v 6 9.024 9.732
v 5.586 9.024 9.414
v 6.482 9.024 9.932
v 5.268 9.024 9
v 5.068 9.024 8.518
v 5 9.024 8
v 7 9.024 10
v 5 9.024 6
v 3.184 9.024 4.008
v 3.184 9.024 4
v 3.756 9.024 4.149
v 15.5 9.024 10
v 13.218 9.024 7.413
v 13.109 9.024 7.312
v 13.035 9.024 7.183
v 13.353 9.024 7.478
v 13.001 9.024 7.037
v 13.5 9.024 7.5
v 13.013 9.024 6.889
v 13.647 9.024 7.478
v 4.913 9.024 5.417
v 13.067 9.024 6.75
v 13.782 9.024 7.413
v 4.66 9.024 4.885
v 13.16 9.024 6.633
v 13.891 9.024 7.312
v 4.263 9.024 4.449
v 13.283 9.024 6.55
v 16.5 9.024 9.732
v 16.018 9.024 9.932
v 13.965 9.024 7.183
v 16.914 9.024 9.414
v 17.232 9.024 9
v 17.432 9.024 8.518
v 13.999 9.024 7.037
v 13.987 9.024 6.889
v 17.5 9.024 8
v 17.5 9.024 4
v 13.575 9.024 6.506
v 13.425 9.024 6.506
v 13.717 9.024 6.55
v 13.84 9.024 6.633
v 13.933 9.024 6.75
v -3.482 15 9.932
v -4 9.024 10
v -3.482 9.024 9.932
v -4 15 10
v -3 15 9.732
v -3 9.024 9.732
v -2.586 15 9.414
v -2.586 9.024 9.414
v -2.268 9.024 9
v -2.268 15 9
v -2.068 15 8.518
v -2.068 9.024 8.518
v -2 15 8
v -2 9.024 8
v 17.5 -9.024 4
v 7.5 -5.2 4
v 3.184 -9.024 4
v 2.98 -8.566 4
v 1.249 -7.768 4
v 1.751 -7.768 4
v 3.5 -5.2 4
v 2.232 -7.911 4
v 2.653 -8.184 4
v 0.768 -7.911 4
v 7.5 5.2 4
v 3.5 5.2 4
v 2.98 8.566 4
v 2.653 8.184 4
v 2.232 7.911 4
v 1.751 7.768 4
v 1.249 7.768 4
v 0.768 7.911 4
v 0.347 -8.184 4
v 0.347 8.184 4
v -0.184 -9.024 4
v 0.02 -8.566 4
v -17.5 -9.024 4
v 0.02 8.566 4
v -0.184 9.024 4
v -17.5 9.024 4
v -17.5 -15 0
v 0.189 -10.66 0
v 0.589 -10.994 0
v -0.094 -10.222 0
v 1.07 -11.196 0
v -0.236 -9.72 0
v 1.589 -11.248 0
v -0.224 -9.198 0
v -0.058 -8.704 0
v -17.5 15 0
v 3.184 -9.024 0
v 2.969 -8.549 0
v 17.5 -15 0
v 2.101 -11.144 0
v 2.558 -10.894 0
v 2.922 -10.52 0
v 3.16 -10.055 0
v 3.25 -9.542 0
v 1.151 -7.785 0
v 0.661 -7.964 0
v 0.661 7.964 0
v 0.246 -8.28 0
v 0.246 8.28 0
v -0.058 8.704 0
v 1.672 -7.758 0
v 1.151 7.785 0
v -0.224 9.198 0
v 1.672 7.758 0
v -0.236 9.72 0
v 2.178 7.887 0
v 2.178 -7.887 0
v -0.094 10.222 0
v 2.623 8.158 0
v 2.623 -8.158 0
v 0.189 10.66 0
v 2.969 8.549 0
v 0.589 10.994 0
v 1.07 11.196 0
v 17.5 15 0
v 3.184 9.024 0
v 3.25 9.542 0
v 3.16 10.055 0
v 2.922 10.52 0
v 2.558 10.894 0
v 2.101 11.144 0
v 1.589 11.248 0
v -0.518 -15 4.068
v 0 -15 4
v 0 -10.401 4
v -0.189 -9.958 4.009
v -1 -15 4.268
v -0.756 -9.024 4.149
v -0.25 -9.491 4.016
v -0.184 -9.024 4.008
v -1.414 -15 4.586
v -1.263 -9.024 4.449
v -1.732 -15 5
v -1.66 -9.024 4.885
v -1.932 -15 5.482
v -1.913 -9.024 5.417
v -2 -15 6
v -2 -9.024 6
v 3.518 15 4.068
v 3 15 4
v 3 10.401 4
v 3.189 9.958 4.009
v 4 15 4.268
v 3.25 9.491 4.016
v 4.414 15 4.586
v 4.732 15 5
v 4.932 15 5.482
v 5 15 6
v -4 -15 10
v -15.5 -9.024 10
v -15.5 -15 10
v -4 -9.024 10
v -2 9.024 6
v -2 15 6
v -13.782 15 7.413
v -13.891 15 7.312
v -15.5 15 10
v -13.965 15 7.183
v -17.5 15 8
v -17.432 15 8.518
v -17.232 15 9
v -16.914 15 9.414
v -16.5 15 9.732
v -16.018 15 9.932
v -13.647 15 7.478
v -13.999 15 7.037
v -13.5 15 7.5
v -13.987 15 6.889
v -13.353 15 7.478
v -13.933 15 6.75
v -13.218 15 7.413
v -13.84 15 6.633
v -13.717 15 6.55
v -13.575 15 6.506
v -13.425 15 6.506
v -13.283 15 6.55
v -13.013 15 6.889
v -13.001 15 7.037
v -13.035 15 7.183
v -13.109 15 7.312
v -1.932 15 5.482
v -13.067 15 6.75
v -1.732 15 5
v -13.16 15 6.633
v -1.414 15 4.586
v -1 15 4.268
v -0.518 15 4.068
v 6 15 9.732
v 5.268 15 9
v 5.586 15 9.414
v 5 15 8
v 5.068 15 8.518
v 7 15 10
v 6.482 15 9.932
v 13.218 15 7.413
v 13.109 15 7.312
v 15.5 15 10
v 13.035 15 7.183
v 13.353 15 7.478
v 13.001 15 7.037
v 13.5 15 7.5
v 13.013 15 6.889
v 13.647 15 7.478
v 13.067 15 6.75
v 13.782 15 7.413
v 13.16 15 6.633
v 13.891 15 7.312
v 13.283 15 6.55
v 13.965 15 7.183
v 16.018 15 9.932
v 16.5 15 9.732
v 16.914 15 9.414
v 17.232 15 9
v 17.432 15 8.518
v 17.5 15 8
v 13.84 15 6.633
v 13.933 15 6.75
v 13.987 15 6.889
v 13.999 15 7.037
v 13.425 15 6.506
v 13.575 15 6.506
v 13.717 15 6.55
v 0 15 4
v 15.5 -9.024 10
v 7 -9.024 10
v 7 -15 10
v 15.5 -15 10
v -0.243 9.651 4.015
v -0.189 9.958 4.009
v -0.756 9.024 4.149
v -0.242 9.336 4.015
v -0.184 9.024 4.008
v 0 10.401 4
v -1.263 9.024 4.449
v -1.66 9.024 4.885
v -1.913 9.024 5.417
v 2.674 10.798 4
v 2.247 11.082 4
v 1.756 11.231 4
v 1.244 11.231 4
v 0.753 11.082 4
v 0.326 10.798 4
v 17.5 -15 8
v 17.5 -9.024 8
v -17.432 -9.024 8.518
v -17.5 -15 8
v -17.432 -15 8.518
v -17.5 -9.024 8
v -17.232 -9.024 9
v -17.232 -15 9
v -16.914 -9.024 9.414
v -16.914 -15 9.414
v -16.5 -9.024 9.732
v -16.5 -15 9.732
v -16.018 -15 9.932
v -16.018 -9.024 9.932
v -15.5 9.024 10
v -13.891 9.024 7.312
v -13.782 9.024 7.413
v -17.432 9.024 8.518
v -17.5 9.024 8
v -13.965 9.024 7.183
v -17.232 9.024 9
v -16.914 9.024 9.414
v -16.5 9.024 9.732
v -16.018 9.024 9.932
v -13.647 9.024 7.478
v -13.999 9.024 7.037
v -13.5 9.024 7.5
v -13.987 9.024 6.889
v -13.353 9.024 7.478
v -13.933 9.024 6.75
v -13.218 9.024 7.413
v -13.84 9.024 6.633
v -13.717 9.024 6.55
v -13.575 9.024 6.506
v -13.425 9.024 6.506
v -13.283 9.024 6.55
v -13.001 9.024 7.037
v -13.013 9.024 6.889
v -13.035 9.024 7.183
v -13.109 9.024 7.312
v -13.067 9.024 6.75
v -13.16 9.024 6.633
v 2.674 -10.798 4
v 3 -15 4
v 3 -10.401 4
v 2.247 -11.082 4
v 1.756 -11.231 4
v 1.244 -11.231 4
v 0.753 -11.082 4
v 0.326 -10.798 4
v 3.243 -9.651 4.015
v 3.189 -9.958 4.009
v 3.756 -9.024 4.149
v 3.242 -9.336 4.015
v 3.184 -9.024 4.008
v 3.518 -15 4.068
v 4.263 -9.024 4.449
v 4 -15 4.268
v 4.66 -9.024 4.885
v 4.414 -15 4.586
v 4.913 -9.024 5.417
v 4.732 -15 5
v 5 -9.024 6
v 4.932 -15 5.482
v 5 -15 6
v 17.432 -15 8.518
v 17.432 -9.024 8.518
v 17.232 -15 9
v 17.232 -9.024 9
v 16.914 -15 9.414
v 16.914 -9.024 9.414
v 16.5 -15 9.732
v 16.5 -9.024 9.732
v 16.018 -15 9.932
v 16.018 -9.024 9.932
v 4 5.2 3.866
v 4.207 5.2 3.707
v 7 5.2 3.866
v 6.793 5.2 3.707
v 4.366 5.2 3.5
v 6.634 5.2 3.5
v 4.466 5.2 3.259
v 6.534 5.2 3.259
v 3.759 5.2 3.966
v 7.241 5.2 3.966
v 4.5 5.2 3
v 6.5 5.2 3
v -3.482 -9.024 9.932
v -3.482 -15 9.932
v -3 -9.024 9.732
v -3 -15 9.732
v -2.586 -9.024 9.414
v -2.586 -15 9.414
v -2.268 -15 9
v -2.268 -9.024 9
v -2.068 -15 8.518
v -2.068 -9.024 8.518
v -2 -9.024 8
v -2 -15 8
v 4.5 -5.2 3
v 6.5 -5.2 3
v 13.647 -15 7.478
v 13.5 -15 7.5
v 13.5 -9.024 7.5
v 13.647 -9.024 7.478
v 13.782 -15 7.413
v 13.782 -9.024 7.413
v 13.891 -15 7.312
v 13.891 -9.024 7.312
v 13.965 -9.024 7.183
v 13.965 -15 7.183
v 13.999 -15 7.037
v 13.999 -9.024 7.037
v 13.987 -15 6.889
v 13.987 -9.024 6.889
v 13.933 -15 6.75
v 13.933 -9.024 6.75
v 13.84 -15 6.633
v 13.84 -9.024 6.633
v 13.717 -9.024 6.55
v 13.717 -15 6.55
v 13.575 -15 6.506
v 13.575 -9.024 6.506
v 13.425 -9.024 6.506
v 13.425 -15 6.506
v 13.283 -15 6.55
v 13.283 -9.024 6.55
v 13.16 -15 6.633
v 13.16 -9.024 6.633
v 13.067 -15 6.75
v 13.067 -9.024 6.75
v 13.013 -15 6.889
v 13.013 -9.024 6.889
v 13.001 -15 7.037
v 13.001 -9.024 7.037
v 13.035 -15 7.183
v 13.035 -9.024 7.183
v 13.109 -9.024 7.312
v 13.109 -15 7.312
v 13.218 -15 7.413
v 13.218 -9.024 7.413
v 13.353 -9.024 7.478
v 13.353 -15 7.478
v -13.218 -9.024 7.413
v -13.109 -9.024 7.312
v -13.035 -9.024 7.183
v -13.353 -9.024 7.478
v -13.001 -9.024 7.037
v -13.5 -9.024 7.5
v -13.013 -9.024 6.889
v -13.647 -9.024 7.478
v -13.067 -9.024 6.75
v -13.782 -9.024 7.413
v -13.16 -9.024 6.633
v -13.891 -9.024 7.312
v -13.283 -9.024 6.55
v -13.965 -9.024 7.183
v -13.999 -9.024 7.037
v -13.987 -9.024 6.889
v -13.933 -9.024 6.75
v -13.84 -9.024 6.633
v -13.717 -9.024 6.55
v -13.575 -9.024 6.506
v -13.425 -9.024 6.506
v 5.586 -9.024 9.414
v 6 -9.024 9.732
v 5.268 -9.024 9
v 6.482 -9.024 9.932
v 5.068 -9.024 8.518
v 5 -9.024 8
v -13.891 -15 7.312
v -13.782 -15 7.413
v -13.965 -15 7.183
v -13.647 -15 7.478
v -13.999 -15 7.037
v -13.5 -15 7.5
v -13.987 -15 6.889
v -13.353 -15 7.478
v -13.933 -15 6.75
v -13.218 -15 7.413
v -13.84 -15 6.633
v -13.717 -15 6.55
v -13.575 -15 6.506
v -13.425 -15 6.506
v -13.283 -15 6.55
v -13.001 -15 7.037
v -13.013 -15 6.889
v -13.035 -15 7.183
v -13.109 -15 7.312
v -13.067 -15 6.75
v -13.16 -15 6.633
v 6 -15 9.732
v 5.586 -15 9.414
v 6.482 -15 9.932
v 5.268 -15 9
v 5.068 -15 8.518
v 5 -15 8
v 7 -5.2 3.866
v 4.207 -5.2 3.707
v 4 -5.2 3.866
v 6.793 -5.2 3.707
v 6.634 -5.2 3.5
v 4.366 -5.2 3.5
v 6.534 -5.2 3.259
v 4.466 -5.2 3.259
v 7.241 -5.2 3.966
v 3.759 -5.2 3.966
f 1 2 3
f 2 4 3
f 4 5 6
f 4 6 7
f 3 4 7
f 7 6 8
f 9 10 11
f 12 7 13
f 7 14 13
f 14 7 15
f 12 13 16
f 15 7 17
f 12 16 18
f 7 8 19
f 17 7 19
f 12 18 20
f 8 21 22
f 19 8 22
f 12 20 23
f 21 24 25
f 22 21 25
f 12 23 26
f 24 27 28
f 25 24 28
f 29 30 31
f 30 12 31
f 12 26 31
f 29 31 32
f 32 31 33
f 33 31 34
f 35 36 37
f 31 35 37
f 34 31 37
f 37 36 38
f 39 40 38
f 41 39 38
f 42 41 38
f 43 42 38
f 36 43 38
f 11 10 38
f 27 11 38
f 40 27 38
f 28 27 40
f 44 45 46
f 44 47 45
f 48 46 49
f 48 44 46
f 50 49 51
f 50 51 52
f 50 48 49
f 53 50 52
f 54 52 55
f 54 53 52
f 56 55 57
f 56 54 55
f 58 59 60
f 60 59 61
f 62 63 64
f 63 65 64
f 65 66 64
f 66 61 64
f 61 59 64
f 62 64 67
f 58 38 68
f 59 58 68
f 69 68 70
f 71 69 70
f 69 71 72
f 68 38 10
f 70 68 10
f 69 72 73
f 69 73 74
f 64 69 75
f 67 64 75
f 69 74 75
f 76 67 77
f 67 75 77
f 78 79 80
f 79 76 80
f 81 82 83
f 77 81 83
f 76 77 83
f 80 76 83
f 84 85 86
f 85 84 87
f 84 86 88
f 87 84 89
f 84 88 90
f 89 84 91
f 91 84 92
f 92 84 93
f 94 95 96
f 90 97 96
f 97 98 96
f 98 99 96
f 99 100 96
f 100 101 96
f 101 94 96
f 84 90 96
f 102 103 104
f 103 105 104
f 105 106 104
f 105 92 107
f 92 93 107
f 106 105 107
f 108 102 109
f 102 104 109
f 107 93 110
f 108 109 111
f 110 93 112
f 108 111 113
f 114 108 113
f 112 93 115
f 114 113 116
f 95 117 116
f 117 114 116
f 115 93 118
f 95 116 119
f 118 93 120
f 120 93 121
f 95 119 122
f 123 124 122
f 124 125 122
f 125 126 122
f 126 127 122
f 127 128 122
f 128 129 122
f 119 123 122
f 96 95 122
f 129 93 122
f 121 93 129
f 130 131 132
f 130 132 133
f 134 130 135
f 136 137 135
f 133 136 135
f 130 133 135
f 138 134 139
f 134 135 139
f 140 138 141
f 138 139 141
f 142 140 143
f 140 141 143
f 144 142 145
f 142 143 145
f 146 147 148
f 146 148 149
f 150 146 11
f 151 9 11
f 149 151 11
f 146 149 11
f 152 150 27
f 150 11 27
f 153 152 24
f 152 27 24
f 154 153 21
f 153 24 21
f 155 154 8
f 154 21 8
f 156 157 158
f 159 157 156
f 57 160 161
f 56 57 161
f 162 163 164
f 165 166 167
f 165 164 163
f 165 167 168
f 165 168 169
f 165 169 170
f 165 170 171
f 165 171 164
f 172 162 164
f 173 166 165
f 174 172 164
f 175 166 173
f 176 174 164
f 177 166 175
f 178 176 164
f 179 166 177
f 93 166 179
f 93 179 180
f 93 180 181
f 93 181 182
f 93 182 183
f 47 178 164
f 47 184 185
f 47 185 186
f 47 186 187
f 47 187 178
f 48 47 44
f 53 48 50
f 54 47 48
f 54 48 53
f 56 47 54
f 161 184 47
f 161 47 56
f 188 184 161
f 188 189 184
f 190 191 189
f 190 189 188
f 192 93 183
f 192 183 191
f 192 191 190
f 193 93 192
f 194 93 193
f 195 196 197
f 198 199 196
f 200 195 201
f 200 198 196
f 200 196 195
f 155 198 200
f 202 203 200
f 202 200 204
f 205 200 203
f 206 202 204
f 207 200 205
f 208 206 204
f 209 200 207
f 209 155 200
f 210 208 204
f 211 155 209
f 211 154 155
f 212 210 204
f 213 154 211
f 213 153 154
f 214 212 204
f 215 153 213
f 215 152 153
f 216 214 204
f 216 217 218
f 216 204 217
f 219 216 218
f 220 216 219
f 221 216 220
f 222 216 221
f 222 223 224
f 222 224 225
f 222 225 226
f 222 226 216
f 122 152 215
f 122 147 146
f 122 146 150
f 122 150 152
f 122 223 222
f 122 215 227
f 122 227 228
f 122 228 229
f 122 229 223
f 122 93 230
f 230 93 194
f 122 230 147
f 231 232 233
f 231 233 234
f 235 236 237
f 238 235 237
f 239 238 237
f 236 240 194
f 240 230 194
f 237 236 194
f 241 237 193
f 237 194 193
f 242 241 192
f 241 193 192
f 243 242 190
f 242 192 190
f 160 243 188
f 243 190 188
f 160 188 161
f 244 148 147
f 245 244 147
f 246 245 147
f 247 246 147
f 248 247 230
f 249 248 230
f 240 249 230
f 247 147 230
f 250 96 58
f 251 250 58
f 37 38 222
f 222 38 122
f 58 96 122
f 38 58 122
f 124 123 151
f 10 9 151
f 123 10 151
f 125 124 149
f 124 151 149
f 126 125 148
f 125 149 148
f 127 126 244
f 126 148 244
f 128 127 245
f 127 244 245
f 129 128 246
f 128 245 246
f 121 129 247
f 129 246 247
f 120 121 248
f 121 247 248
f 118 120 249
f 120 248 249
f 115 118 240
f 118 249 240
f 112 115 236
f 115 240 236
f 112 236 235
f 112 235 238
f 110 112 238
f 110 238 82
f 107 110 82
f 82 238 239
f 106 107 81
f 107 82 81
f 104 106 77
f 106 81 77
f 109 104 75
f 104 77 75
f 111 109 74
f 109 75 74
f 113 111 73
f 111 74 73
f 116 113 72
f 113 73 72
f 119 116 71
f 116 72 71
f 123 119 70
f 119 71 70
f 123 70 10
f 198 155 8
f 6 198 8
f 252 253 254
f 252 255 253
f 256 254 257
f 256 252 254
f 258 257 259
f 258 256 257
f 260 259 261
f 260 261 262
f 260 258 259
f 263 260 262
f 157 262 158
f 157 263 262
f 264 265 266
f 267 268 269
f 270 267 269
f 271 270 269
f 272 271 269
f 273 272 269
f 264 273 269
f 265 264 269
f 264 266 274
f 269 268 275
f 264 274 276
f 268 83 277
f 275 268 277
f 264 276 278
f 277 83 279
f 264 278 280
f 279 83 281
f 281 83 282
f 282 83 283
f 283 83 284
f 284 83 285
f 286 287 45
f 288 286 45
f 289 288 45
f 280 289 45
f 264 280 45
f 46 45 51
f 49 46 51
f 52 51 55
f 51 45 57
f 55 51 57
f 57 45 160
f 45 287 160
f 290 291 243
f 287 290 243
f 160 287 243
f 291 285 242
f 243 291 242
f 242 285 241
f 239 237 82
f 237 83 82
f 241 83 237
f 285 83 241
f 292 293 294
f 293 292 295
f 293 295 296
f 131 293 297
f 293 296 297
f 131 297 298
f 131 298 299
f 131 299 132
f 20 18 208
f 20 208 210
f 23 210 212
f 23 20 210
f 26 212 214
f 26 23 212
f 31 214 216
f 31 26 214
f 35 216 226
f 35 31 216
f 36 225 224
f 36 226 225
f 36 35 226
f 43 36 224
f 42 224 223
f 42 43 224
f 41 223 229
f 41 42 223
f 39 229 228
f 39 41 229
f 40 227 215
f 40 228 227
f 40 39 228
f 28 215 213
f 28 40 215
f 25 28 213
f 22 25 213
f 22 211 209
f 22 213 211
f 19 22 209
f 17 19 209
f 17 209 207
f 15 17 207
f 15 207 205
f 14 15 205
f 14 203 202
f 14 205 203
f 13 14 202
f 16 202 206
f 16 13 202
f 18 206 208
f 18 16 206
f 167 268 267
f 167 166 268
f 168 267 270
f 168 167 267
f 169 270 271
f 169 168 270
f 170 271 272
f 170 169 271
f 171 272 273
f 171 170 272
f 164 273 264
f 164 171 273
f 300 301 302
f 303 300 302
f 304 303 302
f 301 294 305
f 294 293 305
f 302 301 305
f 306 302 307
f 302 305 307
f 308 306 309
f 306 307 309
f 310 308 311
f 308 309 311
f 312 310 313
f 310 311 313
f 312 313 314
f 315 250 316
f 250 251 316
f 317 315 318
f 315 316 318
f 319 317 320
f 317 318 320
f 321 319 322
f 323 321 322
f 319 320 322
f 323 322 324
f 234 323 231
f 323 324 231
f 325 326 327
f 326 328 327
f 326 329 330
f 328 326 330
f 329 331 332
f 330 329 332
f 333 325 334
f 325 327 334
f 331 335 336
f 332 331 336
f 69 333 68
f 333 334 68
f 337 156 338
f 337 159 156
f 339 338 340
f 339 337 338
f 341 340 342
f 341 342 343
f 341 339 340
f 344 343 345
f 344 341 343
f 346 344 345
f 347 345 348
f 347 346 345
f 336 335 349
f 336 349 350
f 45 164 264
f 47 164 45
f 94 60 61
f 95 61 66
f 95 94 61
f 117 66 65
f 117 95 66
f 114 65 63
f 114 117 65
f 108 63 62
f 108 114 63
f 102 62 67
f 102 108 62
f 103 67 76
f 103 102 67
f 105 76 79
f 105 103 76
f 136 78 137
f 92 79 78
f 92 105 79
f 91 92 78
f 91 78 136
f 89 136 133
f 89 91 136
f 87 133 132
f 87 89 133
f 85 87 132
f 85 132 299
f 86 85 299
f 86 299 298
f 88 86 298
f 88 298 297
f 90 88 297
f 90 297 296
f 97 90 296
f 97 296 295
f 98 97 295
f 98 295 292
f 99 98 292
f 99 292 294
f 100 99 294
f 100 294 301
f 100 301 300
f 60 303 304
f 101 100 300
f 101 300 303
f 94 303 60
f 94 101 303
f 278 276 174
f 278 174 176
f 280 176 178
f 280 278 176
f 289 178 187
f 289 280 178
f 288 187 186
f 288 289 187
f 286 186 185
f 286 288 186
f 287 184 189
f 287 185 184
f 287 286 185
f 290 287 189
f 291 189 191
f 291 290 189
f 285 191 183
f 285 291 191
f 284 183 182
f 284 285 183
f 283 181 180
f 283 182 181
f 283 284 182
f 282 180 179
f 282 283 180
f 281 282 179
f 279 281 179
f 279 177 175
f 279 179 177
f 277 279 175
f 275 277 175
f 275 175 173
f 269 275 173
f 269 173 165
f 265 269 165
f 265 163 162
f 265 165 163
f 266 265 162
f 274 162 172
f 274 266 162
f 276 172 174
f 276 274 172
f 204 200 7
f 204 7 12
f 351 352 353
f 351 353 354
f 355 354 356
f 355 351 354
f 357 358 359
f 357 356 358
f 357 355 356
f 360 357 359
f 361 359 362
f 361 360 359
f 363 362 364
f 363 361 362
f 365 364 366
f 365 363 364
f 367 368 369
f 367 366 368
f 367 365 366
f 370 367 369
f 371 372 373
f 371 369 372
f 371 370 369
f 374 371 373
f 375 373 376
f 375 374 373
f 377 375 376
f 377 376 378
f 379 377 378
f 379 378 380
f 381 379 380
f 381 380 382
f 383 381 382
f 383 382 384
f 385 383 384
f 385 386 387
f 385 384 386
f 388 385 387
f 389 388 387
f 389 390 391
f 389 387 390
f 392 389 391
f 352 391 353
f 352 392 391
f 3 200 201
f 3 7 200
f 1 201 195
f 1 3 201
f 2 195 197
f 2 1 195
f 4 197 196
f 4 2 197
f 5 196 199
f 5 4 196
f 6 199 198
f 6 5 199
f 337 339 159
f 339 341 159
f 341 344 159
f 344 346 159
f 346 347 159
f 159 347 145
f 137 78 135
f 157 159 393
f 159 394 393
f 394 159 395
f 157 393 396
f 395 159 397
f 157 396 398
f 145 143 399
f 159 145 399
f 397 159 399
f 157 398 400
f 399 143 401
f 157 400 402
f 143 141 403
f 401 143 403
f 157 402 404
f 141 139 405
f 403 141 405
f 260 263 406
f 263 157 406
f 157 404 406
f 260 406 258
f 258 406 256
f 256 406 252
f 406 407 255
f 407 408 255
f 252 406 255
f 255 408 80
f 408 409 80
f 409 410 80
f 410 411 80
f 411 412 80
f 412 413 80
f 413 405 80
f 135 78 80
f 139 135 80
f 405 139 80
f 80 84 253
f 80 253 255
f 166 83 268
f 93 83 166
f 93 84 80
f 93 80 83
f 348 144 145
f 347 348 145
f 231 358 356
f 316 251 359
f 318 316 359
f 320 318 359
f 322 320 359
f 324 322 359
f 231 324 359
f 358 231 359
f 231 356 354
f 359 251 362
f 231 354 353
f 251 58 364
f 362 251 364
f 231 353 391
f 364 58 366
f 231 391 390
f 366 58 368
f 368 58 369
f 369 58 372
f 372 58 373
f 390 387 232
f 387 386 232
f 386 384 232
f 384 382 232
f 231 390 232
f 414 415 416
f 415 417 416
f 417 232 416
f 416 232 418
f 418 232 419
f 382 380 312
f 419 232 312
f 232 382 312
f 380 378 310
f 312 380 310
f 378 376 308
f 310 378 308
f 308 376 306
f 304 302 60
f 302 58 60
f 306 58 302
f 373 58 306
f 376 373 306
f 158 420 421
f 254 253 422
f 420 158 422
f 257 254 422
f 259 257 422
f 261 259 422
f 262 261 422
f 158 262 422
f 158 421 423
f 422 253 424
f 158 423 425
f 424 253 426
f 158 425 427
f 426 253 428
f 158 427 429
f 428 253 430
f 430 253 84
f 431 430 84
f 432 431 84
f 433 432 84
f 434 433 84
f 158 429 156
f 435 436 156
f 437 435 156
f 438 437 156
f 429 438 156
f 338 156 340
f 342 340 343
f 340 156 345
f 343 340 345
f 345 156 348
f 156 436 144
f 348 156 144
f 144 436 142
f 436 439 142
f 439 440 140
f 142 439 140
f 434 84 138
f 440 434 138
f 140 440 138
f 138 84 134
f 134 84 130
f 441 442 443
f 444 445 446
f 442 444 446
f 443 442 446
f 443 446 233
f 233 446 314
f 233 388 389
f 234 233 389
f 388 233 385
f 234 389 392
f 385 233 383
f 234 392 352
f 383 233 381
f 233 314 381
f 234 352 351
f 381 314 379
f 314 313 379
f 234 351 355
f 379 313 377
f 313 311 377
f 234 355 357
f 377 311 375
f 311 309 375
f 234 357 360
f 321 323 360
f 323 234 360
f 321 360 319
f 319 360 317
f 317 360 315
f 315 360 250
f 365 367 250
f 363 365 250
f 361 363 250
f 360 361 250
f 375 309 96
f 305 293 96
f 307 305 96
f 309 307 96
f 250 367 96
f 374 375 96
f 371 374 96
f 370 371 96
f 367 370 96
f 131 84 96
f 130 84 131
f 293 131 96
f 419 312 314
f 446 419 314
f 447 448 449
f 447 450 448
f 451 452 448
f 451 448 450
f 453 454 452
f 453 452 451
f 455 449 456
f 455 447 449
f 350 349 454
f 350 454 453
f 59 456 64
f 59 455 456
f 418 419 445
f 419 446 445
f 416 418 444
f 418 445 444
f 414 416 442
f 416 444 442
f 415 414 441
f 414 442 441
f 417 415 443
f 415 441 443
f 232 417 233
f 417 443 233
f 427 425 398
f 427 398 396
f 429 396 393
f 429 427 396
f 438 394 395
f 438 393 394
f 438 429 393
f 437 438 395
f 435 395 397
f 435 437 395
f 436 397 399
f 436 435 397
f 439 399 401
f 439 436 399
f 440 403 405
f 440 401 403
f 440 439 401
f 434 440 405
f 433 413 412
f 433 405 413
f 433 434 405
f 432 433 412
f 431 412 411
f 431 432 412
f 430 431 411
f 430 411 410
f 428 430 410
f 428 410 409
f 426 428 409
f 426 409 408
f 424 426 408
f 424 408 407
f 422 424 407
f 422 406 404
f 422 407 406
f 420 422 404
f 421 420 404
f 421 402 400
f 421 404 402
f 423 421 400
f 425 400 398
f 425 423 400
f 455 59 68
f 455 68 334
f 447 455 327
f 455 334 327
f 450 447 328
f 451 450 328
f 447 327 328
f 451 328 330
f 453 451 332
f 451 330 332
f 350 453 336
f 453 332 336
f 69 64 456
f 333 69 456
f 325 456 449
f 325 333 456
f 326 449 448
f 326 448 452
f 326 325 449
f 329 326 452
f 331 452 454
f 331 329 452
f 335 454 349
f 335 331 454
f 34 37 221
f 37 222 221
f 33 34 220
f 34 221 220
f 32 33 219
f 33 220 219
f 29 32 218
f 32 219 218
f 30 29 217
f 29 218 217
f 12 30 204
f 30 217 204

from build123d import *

# Parameters (mm, degrees)
SKETCHBUTTOM_W                   = 35
SKETCHBUTTOM_H                   = 30
BOSSEXTRUDEBUTTOM_DEPTH          = 10
CUTEXTRUDEFINGERROOM_START       = 4
CUTEXTRUDEFINGERROOM_DEPTH       = 6
FILLETTOP_R                      = 2
CUTEXTRUDEFINGERSHAFT_DEPTH      = 26.124689053
CUTEXTRUDEFINGERSHAFT_DEPTH_BACK = 26.124689053
SKETCHFINGERSHAFT_R              = 0.5
CUTEXTRUDESENSORROOM_START       = 3
SKETCH12_W                       = 2
SKETCH12_H                       = 10.4
CUTEXTRUDESENSORROOM_DEPTH       = 3
FILLETSENSORROOM_R               = 1
SKETCHFIXTUREHOLES_R             = 1.75
CUTEXTRUDEFIXTUREHOLES_DEPTH     = 5


with BuildPart() as part:
    # SketchButtom → BossExtrudeButtom (new body)
    with BuildSketch(Plane.XY):
        Rectangle(SKETCHBUTTOM_W, SKETCHBUTTOM_H)
    extrude(amount=BOSSEXTRUDEBUTTOM_DEPTH)

    # SketchFingerRoom → CutExtrudeFingerRoom (cut)
    with BuildSketch(Plane.XY.offset(CUTEXTRUDEFINGERROOM_START)):
        Polygon((5, 9.024), (17.5, 9.024), (17.5, -9.024), (5, -9.024), (5, -15), (-2, -15), (-2, -9.024), (-17.5, -9.024), (-17.5, 9.024), (-2, 9.024), (-2, 15), (5, 15), align=None)
    extrude(amount=CUTEXTRUDEFINGERROOM_DEPTH, mode=Mode.SUBTRACT)

    # FilletTop
    fillettop_edges = [part.edges().sort_by_distance(p)[0] for p in [
        (17.5, -12.012, 10),
        (-17.5, -12.012, 10),
        (17.5, 12.012, 10),
        (-2, 12.012, 4),
        (-2, -12.012, 4),
        (5, -12.012, 4),
        (5, 12.012, 4),
        (-2, 12.012, 10),
        (-2, -12.012, 10),
        (5, -12.012, 10),
        (5, 12.012, 10),
        (-17.5, 12.012, 10),
    ]]
    fillet(fillettop_edges, radius=FILLETTOP_R)

    # SketchFingerShaft → CutExtrudeFingerShaft (cut, two sides: drawn at the far end of the back side and taken through both)
    with BuildSketch(Plane(origin=(0, 0, 0), x_dir=(1, 0, 0), z_dir=(0, 1, 0)).offset(-CUTEXTRUDEFINGERSHAFT_DEPTH_BACK)):
        with Locations(Location((-13.5, -7, 0), (0, 0, 270))):
            Circle(SKETCHFINGERSHAFT_R)
        with Locations(Location((13.5, -7, 0), (0, 0, 270))):
            Circle(SKETCHFINGERSHAFT_R)
    extrude(amount=CUTEXTRUDEFINGERSHAFT_DEPTH + CUTEXTRUDEFINGERSHAFT_DEPTH_BACK, mode=Mode.SUBTRACT)

    # Sketch12 → CutExtrudeSensorRoom (cut)
    with BuildSketch(Plane.XY.offset(CUTEXTRUDESENSORROOM_START)):
        with Locations((5.5, 0)):
            Rectangle(SKETCH12_W, SKETCH12_H)
    extrude(amount=CUTEXTRUDESENSORROOM_DEPTH, mode=Mode.SUBTRACT)

    # FilletSensorRoom
    filletsensorroom_edges = [part.edges().sort_by_distance(p)[0] for p in [
        (4.5, 0, 4),
        (6.5, 0, 4),
    ]]
    fillet(filletsensorroom_edges, radius=FILLETSENSORROOM_R - 0.0001)  # a hair under: the kernel refuses the full size

    # SketchFixtureHoles → CutExtrudeFixtureHoles (cut, symmetric)
    with BuildSketch(Plane.XY):
        with Locations(Location((1.5, -9.5, 0), (0, 0, 15.783313229))):
            Circle(SKETCHFIXTUREHOLES_R)
        with Locations(Location((1.5, 9.5, 0), (0, 0, 344.216686771))):
            Circle(SKETCHFIXTUREHOLES_R)
    extrude(amount=CUTEXTRUDEFIXTUREHOLES_DEPTH, both=True, mode=Mode.SUBTRACT)


solid = part.part
